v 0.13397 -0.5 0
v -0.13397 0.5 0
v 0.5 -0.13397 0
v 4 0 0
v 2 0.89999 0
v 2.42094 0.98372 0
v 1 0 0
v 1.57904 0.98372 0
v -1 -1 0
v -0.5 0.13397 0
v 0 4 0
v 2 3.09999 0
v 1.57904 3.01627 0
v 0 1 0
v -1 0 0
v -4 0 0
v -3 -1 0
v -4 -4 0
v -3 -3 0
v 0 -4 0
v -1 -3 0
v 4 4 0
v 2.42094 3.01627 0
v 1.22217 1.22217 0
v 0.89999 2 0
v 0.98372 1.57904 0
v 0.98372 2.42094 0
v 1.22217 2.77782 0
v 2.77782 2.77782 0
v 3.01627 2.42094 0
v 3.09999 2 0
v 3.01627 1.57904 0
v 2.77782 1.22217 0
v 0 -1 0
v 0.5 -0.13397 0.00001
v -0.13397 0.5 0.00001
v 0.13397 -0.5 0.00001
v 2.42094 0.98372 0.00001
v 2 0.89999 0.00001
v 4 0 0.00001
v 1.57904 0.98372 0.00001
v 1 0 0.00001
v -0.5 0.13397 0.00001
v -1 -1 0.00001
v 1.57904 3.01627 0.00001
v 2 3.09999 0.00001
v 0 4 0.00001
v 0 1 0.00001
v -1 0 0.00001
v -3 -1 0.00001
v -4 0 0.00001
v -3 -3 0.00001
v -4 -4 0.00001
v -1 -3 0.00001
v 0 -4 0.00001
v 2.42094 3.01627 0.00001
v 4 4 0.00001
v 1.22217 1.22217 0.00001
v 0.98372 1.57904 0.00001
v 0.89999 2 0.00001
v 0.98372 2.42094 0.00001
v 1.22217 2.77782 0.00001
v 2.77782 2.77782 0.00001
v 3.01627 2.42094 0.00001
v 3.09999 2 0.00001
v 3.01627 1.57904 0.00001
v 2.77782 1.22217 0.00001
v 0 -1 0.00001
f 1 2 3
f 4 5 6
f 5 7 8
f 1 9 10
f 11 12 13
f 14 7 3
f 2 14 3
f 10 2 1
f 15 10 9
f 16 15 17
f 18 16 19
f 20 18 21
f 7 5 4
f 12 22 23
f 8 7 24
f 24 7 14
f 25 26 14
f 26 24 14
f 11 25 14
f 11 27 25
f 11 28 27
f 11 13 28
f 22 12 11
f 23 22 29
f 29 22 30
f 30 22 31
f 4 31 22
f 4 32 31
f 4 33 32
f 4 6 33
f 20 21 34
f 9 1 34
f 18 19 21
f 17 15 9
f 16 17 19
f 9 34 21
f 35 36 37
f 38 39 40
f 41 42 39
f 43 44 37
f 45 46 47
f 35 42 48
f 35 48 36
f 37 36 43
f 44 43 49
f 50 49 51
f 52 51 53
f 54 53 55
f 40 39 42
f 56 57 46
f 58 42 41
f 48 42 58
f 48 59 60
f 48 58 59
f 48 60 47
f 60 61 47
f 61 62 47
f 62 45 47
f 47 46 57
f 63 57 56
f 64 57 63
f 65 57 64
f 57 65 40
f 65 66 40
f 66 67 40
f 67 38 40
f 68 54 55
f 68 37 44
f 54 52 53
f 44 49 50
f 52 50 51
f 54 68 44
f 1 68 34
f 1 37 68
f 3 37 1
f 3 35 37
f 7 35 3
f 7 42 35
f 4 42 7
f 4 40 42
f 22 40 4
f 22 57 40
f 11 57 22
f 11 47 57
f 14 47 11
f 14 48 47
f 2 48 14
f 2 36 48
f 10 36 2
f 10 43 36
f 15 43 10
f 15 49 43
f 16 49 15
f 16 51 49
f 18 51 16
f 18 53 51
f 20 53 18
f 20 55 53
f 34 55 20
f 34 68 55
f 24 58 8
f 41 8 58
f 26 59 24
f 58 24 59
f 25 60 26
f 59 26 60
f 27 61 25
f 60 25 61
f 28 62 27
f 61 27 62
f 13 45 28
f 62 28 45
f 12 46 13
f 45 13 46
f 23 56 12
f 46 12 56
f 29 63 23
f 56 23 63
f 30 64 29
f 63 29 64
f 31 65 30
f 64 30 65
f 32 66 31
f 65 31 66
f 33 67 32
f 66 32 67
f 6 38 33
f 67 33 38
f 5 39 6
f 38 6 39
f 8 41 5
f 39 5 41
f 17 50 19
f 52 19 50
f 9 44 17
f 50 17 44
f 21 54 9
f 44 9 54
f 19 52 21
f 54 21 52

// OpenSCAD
module yourshape() {
    // for example
    difference() {
        offset(-1) offset(delta = +1, $fn = 0)
        union() {
            rotate(-180) square(4);
            square(4);
        }
        translate([2, 2]) circle(1.1, $fn = 16);
        translate(-[2, 2]) square(2,true);
    }
}
//
module yourprofile() {
    // for example
    hull() {
        translate([0, -1]) circle(.25, $fn = 4);
        translate([0, 1]) circle(.25, $fn = 16);
    }
}
//
profile_on_shape_sweep() {
    yourshape();
    yourprofile();
};
//
//*//*//*//*//*//*//*//*//*//*//*//*//*//*//*//*//*//*//*//
//*//*//*//*//*//*//*//*//*//*//*//*//*//*//*//*//*//*//*//
//*//*//*//*//*//*//*//*//*//*//*//*//*//*//*//*//*//*//*//
//
module profile_on_shape_sweep($fn = 12) {
    minkowski() {
        rotate_extrude() trimToZeroX() children(1);
        ExtrudeToNothing() children(0);
    }
}
//convert 2d shape to almost flat 3d shape
module ExtrudeToNothing() {
    s = 1e5;
    scale(1 / s)
    linear_extrude(height = 1) {
        scale(s)
        children();
    }
}
// trimToZeroX() helper
module bbox2d() {
    minkowski() {
        projection()
        rotate([0, -90, 0])
        linear_extrude(1e-6)
        children();
        projection()
        rotate([90, 0, 0])
        linear_extrude(1e-6, center = true)
        flipcopy([1, 0]) children();
    }
}
// trimToZeroX() helper
module flipcopy(flip) {
    union() {
        children();
        mirror(flip) children();
    }
}
// auto clip 2d shape by y axis, keep positive side
module trimToZeroX() {
    intersection() {
        children();
        minkowski() {
            translate([0, 0]) difference() {
                translate([0.001, 0])
                bbox2d() children();
                bbox2d() children();
            }
            projection()
            rotate([90, 0, 0])
            linear_extrude(1e-6, center = true)
            children();
        }
    }
}
